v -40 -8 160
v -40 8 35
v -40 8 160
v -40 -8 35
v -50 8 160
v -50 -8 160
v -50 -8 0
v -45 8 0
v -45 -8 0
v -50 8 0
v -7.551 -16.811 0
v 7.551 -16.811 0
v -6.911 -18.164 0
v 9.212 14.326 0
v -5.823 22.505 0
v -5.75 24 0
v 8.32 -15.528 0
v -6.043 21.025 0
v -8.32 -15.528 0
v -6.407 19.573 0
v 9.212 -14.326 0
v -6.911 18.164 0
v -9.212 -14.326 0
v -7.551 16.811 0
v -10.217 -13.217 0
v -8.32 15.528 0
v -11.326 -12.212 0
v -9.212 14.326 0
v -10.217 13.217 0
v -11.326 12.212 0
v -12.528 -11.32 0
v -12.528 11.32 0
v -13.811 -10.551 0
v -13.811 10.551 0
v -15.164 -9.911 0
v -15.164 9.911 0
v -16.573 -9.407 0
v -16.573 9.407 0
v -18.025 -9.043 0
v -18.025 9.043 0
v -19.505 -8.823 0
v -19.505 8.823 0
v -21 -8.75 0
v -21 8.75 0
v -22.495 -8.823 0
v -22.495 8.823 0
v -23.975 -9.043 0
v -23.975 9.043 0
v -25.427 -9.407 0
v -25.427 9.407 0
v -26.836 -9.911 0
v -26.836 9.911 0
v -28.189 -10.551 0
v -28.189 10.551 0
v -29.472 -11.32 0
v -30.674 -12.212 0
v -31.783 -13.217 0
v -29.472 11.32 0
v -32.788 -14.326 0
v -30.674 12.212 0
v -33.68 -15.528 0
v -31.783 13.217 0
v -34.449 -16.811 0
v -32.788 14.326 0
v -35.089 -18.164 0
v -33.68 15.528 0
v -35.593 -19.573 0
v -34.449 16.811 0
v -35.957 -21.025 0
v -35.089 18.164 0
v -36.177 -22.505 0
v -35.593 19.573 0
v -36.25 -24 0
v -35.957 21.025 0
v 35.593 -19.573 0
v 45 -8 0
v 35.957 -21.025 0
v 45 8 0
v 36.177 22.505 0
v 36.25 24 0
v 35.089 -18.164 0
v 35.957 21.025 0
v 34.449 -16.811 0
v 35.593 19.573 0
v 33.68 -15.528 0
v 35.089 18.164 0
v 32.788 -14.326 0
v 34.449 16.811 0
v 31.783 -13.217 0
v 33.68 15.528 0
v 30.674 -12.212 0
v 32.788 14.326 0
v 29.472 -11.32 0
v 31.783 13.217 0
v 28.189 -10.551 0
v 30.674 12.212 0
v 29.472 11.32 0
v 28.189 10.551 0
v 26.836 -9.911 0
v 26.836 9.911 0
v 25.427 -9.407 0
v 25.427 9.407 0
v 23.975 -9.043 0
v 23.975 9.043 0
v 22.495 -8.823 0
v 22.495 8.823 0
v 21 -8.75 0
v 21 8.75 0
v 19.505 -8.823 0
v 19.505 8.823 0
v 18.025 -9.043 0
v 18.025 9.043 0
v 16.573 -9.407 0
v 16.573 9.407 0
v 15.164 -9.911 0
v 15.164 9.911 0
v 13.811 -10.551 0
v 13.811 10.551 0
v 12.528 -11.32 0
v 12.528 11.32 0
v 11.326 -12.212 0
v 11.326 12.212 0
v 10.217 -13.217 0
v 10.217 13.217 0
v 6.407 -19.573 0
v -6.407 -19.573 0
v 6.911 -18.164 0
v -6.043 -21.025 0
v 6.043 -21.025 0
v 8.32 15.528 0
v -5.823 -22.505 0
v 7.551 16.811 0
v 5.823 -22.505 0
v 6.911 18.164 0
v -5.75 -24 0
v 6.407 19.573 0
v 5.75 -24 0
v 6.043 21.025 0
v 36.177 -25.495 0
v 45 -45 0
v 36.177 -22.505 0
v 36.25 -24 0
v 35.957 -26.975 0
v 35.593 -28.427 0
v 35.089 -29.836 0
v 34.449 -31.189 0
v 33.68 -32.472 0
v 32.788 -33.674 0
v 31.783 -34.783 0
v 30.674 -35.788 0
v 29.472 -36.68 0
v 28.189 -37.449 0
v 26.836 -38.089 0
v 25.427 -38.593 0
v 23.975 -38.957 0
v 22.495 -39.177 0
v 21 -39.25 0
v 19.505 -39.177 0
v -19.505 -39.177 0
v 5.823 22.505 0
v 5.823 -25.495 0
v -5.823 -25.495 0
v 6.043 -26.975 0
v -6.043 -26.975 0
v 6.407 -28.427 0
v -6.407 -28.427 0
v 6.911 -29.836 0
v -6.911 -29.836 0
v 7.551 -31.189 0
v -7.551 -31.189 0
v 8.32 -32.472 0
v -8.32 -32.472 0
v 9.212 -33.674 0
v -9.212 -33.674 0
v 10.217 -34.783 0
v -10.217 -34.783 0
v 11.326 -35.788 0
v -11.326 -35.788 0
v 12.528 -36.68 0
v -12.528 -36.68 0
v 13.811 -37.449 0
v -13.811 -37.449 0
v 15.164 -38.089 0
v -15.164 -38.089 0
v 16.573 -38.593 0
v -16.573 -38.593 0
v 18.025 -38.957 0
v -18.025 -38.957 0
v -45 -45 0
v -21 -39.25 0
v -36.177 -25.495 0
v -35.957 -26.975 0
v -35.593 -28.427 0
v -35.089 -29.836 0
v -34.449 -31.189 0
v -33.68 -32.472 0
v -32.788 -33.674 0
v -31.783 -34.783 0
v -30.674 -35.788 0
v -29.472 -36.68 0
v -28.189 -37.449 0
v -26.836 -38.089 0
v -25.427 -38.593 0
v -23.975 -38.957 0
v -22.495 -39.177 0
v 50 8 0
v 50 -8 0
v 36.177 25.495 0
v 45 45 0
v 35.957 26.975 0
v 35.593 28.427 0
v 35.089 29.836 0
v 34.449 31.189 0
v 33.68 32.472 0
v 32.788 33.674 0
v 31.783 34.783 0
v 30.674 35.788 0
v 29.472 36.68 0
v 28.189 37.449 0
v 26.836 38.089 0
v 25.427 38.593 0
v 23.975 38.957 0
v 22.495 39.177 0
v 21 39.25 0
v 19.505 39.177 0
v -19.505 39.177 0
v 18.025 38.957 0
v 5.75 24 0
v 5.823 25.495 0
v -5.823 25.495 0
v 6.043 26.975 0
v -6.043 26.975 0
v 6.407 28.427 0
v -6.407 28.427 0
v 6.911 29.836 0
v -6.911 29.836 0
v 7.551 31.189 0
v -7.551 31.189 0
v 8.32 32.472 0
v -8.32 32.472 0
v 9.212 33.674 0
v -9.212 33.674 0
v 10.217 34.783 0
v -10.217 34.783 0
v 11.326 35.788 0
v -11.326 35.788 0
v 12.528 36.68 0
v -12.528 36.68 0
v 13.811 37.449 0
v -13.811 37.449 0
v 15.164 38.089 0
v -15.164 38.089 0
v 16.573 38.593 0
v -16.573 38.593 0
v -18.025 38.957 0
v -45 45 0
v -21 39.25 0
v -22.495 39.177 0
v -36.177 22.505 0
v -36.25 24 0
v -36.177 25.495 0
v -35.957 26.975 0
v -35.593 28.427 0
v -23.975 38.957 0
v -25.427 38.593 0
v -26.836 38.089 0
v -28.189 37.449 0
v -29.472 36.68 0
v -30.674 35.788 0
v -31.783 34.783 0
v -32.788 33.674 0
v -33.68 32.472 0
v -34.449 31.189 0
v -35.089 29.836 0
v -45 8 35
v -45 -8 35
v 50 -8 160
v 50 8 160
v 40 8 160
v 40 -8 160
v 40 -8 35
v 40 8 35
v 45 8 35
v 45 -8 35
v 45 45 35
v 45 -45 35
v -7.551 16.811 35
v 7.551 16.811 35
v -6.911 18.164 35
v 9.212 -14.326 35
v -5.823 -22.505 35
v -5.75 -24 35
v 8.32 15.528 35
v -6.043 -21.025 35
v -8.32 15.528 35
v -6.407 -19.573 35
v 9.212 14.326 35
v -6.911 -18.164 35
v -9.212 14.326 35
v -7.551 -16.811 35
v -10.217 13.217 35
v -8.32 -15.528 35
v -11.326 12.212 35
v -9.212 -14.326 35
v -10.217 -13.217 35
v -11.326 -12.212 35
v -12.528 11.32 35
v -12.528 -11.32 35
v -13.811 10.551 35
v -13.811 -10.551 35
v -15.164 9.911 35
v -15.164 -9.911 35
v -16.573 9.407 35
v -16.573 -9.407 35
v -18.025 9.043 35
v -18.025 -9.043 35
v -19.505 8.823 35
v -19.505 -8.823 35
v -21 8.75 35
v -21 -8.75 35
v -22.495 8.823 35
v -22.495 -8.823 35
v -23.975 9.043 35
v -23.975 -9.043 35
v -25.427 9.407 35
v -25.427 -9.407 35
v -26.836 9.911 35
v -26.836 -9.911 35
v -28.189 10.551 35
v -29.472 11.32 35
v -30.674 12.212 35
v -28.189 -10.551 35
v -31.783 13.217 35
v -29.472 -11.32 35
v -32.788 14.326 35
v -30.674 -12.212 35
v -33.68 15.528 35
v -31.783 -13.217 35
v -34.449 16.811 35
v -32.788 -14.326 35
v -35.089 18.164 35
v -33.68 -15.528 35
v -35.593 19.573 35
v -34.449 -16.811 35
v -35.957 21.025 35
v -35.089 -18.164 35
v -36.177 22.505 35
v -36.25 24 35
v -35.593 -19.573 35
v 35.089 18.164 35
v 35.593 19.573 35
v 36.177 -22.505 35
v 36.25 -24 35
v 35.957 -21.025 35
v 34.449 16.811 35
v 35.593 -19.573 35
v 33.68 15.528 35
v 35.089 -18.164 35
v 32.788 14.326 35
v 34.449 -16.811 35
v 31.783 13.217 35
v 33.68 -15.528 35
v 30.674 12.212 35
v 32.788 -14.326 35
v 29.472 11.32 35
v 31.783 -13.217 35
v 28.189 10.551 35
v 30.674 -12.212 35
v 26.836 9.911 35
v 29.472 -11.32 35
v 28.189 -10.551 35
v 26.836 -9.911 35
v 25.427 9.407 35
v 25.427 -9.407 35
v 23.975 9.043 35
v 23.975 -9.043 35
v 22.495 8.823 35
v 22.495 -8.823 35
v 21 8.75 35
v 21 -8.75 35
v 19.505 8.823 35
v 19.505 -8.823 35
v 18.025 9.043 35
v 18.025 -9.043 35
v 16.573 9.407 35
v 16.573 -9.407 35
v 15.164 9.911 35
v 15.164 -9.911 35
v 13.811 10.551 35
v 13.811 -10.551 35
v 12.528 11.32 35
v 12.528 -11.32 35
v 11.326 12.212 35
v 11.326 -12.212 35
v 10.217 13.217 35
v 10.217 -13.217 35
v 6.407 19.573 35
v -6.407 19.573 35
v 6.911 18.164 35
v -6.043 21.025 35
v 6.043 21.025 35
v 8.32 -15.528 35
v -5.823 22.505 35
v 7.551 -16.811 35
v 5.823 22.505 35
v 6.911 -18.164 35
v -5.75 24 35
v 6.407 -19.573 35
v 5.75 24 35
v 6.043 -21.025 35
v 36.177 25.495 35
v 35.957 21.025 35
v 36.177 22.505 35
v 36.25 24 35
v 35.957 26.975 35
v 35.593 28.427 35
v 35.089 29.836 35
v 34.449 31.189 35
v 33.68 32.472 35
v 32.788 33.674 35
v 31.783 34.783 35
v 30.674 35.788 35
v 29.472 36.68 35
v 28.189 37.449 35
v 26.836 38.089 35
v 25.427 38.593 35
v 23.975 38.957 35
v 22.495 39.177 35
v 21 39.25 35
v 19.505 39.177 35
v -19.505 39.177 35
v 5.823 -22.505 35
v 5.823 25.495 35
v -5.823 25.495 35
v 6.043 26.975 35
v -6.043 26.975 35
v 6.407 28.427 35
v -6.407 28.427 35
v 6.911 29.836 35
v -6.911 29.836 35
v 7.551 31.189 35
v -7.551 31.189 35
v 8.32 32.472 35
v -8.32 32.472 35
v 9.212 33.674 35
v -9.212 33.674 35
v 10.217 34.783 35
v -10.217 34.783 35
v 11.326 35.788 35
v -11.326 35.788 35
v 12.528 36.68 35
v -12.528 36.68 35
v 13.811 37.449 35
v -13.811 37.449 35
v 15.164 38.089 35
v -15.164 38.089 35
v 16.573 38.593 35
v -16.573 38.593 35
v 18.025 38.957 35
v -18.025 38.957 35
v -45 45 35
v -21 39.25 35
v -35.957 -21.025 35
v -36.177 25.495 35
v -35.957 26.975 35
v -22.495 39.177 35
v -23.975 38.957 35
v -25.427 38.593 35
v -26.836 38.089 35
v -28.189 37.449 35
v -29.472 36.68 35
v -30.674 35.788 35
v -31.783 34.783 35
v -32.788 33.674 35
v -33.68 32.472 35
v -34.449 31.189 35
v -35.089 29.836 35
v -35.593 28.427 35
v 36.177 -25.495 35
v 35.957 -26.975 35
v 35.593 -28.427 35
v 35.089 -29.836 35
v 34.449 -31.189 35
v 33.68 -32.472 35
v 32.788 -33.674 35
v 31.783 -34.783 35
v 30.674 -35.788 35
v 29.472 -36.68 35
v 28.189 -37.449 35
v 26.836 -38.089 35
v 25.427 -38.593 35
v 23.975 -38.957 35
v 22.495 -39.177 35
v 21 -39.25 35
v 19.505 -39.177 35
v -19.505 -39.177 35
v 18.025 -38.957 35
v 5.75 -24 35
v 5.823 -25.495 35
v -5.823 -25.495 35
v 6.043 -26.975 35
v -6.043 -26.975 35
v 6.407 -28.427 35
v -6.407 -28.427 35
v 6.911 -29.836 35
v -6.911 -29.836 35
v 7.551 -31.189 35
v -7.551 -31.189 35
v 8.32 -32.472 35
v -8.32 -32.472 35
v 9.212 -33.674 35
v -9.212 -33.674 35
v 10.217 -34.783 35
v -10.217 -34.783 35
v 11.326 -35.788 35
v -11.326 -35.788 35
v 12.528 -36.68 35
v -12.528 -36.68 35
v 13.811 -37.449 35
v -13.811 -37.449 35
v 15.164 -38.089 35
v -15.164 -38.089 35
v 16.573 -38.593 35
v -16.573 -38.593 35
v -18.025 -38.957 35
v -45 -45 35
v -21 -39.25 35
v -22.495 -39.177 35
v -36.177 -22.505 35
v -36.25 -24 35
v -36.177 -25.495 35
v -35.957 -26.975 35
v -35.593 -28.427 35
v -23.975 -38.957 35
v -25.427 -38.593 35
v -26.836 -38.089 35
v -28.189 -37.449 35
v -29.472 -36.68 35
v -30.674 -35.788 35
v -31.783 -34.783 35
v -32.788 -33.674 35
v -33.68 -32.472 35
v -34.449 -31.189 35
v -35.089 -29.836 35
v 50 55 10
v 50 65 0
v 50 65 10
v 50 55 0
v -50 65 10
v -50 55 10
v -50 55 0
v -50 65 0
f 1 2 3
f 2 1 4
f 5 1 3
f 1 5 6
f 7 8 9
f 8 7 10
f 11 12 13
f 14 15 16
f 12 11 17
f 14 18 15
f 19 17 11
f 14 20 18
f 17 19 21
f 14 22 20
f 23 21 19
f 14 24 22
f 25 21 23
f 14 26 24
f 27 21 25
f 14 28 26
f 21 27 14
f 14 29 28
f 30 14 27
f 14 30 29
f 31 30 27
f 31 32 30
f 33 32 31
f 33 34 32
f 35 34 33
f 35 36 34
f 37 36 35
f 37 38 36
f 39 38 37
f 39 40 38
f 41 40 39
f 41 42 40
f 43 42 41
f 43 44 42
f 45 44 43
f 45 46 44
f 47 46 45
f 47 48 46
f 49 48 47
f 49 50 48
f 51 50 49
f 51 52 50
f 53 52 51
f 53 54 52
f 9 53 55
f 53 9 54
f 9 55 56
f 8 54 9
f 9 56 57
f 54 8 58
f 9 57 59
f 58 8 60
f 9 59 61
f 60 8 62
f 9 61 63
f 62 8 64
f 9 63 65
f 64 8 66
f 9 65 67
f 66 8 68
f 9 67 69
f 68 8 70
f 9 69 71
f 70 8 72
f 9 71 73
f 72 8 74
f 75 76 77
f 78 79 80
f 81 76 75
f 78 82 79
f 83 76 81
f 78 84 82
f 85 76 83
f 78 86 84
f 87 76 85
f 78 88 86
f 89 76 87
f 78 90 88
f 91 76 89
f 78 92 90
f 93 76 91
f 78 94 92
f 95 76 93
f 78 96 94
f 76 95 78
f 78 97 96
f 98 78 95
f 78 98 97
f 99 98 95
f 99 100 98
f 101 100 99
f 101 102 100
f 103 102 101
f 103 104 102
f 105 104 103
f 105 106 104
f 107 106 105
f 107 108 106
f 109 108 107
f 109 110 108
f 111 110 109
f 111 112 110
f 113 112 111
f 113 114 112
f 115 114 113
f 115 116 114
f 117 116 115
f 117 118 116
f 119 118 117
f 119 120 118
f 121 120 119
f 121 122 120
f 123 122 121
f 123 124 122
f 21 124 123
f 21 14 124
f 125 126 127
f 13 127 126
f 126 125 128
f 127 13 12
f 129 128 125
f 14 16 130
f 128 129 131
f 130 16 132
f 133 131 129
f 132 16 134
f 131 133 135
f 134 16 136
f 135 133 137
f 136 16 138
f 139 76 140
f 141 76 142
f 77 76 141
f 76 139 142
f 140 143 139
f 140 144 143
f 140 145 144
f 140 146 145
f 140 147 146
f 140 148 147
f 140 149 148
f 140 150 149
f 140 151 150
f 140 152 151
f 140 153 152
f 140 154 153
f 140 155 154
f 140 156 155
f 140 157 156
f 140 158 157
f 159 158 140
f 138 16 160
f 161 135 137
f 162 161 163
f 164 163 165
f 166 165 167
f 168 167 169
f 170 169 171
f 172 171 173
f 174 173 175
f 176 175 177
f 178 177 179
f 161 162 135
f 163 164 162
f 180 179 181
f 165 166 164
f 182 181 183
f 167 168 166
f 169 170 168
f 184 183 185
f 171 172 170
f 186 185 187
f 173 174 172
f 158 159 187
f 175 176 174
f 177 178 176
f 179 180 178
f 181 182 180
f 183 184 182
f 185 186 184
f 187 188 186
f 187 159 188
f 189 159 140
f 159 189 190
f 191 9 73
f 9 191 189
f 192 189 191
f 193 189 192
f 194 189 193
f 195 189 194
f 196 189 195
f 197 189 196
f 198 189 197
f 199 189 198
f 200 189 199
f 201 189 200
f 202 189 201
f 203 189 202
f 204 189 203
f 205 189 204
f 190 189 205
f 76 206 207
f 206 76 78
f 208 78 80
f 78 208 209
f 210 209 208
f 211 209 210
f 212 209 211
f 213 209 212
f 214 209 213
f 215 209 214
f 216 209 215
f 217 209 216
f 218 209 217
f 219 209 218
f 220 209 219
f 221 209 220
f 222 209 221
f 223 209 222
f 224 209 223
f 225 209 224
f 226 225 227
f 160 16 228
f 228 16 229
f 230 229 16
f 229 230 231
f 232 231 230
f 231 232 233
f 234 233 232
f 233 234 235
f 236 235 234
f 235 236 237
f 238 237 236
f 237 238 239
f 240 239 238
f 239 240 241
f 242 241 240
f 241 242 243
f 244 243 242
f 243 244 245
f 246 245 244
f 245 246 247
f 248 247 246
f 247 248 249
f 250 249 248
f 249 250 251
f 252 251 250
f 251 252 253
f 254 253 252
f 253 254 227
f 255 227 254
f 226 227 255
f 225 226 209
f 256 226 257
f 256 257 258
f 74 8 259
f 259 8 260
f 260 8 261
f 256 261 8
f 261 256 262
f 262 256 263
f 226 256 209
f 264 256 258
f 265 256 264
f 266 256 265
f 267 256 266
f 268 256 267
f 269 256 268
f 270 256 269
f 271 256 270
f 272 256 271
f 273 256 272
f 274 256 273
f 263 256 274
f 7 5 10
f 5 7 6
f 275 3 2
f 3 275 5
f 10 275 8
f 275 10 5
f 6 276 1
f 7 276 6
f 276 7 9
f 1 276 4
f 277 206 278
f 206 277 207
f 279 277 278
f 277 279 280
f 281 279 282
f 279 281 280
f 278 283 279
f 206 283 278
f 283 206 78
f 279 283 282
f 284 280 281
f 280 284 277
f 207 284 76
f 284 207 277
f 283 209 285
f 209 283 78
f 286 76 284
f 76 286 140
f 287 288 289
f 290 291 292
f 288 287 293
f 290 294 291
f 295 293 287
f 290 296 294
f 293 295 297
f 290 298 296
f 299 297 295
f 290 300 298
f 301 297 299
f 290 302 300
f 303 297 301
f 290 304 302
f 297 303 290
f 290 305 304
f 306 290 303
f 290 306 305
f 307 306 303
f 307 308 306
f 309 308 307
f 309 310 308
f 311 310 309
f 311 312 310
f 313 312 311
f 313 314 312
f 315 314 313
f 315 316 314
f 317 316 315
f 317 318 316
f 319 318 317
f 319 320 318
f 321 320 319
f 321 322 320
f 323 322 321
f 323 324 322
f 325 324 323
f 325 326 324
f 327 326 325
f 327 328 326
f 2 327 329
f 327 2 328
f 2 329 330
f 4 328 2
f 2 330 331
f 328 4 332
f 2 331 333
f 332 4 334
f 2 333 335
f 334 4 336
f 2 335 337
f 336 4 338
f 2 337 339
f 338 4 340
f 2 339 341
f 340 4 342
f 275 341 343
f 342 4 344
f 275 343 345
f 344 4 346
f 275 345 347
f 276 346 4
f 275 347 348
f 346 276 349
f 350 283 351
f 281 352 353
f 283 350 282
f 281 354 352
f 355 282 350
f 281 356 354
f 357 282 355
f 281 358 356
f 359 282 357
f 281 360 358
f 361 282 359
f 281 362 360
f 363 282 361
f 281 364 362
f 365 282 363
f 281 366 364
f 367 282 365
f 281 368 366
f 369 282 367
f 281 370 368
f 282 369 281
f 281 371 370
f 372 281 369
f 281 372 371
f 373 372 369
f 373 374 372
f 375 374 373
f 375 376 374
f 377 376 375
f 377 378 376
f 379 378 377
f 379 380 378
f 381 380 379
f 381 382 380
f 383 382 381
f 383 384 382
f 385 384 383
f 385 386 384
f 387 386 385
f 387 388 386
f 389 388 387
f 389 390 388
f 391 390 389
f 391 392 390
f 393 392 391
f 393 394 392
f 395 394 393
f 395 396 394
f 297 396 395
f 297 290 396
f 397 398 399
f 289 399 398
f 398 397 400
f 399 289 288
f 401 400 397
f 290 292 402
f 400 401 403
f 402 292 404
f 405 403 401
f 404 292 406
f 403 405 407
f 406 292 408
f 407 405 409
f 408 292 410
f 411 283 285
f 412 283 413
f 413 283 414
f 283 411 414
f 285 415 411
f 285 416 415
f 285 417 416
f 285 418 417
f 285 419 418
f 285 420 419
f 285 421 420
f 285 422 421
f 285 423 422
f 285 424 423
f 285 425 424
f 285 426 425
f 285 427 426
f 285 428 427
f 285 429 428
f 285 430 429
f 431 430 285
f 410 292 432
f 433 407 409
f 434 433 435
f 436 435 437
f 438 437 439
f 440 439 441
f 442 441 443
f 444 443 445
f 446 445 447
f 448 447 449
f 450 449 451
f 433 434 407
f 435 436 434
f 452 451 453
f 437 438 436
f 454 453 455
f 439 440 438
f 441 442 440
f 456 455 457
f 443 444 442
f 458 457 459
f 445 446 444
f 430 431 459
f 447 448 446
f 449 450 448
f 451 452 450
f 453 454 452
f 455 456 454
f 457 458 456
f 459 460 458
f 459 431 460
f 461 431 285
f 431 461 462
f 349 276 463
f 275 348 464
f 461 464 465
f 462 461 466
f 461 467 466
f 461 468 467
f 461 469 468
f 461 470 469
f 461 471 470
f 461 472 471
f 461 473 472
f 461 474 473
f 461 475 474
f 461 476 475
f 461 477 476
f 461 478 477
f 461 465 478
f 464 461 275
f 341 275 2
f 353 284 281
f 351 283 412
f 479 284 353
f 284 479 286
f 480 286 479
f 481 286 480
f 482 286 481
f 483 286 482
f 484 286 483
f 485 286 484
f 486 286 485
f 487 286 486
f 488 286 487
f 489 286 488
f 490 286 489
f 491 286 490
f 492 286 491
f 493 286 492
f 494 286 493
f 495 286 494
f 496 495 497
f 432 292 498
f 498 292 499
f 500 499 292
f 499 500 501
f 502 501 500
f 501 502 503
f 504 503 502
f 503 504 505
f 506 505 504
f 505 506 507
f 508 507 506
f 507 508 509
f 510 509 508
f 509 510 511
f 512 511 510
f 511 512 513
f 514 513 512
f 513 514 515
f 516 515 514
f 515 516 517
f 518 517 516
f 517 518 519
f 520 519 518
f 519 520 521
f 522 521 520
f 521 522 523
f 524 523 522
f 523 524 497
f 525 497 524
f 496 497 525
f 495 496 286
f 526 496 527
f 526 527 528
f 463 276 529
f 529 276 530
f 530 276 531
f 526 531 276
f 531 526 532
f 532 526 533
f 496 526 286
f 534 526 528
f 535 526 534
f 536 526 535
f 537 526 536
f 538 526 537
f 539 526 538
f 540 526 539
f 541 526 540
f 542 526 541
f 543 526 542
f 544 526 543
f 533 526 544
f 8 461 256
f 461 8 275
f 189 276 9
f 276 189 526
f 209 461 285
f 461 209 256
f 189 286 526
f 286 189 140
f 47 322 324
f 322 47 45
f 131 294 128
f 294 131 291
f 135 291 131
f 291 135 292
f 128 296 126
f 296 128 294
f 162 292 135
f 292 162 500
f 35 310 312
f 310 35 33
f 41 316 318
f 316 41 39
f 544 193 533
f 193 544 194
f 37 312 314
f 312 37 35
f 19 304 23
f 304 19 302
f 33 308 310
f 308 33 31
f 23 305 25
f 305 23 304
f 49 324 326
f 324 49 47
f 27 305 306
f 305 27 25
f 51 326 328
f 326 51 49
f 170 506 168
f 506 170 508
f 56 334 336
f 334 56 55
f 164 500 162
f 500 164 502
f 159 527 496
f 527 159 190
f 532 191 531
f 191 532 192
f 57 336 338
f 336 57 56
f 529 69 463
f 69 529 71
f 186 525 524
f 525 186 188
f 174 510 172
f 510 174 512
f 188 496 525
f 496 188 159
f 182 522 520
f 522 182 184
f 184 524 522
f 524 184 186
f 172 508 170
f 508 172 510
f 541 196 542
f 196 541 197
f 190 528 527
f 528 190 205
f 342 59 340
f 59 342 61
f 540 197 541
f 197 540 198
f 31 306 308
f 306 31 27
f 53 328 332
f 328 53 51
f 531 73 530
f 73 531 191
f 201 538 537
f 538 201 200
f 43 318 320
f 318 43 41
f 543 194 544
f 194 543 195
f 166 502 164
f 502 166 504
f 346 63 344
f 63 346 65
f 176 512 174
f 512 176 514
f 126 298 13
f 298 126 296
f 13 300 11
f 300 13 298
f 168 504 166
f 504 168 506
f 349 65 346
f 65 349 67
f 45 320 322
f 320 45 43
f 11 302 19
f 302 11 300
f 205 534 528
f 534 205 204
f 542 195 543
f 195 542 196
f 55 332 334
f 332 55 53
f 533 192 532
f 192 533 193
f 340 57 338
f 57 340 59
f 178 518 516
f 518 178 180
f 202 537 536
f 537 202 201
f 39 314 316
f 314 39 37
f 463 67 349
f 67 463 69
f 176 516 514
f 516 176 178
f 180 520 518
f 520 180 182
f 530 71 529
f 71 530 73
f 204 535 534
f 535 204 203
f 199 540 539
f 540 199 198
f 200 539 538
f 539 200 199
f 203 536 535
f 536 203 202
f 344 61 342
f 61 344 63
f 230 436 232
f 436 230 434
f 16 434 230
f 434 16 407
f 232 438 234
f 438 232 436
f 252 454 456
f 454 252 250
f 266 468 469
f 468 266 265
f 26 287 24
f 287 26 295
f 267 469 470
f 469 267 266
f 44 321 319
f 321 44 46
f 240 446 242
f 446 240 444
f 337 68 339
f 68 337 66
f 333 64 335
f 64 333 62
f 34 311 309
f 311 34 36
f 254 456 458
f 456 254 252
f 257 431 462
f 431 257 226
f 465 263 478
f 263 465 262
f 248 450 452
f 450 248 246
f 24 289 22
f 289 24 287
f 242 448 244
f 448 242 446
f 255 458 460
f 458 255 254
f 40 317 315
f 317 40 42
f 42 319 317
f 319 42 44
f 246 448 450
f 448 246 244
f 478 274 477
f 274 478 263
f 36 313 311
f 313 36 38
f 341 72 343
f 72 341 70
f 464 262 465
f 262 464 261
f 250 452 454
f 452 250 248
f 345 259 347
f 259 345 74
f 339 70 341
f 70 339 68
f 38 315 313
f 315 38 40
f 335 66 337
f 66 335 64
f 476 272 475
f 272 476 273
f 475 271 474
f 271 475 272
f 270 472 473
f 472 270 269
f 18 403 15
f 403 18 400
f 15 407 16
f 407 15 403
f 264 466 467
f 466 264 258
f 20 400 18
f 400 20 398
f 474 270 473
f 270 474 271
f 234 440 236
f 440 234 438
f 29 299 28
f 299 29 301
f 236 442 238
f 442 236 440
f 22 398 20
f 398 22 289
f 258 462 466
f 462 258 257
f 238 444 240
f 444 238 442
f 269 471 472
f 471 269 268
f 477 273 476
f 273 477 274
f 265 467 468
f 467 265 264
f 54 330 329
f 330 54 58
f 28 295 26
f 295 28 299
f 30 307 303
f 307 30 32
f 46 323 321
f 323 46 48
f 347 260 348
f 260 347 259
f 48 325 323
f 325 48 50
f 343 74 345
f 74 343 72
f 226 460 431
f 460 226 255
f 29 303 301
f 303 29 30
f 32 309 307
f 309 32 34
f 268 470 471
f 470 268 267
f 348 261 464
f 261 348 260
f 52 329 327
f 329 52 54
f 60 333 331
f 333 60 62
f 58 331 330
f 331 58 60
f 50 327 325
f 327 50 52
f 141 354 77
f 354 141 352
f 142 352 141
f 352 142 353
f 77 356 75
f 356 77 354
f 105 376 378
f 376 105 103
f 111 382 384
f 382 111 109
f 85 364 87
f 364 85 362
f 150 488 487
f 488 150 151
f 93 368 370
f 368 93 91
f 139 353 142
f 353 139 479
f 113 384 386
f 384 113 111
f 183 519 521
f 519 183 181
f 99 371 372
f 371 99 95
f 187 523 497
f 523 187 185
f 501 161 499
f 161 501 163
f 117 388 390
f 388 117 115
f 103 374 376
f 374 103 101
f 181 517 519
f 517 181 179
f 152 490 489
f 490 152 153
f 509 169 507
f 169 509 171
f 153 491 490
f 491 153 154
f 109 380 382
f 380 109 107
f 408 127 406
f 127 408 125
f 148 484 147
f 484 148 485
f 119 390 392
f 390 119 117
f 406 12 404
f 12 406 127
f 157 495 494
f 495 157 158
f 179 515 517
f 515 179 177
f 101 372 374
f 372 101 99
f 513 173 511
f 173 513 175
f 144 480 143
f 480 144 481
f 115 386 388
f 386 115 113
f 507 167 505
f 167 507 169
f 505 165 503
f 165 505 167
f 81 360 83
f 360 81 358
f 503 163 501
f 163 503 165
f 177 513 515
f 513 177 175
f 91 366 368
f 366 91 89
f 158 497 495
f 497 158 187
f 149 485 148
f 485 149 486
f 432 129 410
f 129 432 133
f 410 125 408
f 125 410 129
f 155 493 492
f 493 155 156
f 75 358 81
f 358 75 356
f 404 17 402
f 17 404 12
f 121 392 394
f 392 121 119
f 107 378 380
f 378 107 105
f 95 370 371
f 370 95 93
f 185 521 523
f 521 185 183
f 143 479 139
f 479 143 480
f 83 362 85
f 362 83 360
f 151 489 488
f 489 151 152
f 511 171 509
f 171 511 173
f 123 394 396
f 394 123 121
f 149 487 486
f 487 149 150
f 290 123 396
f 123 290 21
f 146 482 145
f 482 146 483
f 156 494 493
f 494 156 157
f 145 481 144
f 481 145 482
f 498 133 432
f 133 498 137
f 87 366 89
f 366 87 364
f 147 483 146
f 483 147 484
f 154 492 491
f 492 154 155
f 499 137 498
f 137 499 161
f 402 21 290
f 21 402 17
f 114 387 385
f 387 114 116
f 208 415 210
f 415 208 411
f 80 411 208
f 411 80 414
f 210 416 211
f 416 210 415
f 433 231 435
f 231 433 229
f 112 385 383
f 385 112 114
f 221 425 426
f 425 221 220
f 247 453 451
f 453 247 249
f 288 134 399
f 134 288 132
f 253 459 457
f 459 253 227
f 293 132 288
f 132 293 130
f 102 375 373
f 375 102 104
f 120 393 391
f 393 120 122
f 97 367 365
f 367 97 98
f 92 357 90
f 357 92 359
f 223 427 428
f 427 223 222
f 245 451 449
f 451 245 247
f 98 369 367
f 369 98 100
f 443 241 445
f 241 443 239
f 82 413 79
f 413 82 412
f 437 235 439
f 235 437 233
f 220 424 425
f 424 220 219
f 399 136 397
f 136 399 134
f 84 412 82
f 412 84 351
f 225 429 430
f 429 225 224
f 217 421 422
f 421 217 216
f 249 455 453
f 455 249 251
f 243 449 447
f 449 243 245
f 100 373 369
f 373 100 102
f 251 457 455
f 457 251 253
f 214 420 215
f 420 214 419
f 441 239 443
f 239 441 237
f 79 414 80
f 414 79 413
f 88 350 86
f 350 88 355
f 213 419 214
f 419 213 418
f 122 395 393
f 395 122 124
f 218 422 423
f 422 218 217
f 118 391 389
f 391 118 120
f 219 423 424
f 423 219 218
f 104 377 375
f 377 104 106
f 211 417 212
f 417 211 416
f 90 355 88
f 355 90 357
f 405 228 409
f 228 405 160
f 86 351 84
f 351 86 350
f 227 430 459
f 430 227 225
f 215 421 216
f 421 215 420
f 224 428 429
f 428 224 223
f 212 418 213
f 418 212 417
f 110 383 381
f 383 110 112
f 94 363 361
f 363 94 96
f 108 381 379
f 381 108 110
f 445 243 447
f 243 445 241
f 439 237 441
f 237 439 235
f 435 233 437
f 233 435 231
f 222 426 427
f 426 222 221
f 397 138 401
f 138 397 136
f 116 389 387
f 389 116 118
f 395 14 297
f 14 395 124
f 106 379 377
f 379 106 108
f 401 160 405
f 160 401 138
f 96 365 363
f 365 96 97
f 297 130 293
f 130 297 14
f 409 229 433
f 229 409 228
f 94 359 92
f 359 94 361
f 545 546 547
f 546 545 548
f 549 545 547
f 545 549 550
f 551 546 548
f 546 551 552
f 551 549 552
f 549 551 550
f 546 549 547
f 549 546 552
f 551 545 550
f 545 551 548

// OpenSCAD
// =====================================================================
// 4x 50 mL conical tube carrier, printed as two parts side by side.
// Part 1: base block + two posts (posts have square through-holes).
// Part 2: square handle bar (pushed through both posts after printing).
// Units: mm.  Print orientation: parts rest on XY plane (z = 0), +Z up.
// =====================================================================

$fn = 64;

// ---------------- Part 1 : base block ----------------
base_w   = 90;   // X extent of base block
base_d   = 90;   // Y extent of base block
base_h   = 35;   // Z height of base block

// Blind tube seats (50 mL conical tubes)
seat_d   = 30.5; // seat diameter
seat_dep = 30;   // seat depth (leaves a 5 mm floor)
seat_x   = [-21, 21];   // X centres of the four seats
seat_y   = [-24, 24];   // Y centres of the four seats

// ---------------- Part 1 : posts ----------------
post_t   = 10;   // post thickness along X
post_w   = 16;   // post width along Y
post_h   = 160;  // post height (z = 0 .. 160)
post_x   = [-45, 45]; // X centres (flush with the two X end faces)
post_hole = 10.4;     // square through-hole size (X x Y)
post_hole_z = 150;    // Z centre of the square hole

// ---------------- Part 2 : handle bar ----------------
bar_s    = 10;   // square bar cross-section (X x Y)
bar_len  = 100;  // bar length along X
bar_y0   = 55;   // bar Y start (10 mm gap to the base +Y face at y = 45)
bar_y1   = 65;   // bar Y end

// =====================================================================
// PART 1  (base + posts, centred on the origin in X and Y)
// =====================================================================
part1();

// =====================================================================
// PART 2  (handle bar, offset in +Y so it prints beside part 1)
// =====================================================================
part2();

// ---------------------------------------------------------------------
// Part 1 : base block with four open-topped seats (5 mm floor), plus two
//          posts with square through-holes.  Posts are unioned onto the
//          base, then the seats and square holes are cut.
//          Seat cutters stop exactly at the base top (z = 35) so the 5 mm
//          floor is removed and the seats are open-topped (no overhang).
//          Square-hole cutters extend 1 mm past each face they cut.
// ---------------------------------------------------------------------
module part1() {
    difference() {
        // solid to be cut: base block + two posts
        union() {
            // --- base block ---
            translate([-base_w/2, -base_d/2, 0])
                cube([base_w, base_d, base_h]);

            // --- two posts (unioned onto the base) ---
            for (px = post_x)
                translate([px - post_t/2, -post_w/2, 0])
                    cube([post_t, post_w, post_h]);
        }

        // four open-topped seats: cutter height = base top, so the 5 mm
        // floor is cut away and the seat opens to the top (no overhang).
        for (sx = seat_x)
            for (sy = seat_y)
                translate([sx, sy, 0])
                    cylinder(h = base_h, d = seat_d, $fn = 64);

        // square through-holes in the two posts, cut 1 mm past each face
        for (px = post_x)
            translate([px - post_t/2 - 1,
                       post_hole_z - post_hole/2,
                       post_hole_z - post_hole/2])
                cube([post_t + 2, post_hole, post_hole]);
    }
}

// ---------------------------------------------------------------------
// Part 2 : square handle bar lying on the bed along X, centred on x = 0,
//          spanning y = 55 .. 65 (10 mm gap to the base +Y face).
// ---------------------------------------------------------------------
module part2() {
    translate([-bar_len/2, bar_y0, 0])
        cube([bar_len, bar_s, bar_s]);
}
